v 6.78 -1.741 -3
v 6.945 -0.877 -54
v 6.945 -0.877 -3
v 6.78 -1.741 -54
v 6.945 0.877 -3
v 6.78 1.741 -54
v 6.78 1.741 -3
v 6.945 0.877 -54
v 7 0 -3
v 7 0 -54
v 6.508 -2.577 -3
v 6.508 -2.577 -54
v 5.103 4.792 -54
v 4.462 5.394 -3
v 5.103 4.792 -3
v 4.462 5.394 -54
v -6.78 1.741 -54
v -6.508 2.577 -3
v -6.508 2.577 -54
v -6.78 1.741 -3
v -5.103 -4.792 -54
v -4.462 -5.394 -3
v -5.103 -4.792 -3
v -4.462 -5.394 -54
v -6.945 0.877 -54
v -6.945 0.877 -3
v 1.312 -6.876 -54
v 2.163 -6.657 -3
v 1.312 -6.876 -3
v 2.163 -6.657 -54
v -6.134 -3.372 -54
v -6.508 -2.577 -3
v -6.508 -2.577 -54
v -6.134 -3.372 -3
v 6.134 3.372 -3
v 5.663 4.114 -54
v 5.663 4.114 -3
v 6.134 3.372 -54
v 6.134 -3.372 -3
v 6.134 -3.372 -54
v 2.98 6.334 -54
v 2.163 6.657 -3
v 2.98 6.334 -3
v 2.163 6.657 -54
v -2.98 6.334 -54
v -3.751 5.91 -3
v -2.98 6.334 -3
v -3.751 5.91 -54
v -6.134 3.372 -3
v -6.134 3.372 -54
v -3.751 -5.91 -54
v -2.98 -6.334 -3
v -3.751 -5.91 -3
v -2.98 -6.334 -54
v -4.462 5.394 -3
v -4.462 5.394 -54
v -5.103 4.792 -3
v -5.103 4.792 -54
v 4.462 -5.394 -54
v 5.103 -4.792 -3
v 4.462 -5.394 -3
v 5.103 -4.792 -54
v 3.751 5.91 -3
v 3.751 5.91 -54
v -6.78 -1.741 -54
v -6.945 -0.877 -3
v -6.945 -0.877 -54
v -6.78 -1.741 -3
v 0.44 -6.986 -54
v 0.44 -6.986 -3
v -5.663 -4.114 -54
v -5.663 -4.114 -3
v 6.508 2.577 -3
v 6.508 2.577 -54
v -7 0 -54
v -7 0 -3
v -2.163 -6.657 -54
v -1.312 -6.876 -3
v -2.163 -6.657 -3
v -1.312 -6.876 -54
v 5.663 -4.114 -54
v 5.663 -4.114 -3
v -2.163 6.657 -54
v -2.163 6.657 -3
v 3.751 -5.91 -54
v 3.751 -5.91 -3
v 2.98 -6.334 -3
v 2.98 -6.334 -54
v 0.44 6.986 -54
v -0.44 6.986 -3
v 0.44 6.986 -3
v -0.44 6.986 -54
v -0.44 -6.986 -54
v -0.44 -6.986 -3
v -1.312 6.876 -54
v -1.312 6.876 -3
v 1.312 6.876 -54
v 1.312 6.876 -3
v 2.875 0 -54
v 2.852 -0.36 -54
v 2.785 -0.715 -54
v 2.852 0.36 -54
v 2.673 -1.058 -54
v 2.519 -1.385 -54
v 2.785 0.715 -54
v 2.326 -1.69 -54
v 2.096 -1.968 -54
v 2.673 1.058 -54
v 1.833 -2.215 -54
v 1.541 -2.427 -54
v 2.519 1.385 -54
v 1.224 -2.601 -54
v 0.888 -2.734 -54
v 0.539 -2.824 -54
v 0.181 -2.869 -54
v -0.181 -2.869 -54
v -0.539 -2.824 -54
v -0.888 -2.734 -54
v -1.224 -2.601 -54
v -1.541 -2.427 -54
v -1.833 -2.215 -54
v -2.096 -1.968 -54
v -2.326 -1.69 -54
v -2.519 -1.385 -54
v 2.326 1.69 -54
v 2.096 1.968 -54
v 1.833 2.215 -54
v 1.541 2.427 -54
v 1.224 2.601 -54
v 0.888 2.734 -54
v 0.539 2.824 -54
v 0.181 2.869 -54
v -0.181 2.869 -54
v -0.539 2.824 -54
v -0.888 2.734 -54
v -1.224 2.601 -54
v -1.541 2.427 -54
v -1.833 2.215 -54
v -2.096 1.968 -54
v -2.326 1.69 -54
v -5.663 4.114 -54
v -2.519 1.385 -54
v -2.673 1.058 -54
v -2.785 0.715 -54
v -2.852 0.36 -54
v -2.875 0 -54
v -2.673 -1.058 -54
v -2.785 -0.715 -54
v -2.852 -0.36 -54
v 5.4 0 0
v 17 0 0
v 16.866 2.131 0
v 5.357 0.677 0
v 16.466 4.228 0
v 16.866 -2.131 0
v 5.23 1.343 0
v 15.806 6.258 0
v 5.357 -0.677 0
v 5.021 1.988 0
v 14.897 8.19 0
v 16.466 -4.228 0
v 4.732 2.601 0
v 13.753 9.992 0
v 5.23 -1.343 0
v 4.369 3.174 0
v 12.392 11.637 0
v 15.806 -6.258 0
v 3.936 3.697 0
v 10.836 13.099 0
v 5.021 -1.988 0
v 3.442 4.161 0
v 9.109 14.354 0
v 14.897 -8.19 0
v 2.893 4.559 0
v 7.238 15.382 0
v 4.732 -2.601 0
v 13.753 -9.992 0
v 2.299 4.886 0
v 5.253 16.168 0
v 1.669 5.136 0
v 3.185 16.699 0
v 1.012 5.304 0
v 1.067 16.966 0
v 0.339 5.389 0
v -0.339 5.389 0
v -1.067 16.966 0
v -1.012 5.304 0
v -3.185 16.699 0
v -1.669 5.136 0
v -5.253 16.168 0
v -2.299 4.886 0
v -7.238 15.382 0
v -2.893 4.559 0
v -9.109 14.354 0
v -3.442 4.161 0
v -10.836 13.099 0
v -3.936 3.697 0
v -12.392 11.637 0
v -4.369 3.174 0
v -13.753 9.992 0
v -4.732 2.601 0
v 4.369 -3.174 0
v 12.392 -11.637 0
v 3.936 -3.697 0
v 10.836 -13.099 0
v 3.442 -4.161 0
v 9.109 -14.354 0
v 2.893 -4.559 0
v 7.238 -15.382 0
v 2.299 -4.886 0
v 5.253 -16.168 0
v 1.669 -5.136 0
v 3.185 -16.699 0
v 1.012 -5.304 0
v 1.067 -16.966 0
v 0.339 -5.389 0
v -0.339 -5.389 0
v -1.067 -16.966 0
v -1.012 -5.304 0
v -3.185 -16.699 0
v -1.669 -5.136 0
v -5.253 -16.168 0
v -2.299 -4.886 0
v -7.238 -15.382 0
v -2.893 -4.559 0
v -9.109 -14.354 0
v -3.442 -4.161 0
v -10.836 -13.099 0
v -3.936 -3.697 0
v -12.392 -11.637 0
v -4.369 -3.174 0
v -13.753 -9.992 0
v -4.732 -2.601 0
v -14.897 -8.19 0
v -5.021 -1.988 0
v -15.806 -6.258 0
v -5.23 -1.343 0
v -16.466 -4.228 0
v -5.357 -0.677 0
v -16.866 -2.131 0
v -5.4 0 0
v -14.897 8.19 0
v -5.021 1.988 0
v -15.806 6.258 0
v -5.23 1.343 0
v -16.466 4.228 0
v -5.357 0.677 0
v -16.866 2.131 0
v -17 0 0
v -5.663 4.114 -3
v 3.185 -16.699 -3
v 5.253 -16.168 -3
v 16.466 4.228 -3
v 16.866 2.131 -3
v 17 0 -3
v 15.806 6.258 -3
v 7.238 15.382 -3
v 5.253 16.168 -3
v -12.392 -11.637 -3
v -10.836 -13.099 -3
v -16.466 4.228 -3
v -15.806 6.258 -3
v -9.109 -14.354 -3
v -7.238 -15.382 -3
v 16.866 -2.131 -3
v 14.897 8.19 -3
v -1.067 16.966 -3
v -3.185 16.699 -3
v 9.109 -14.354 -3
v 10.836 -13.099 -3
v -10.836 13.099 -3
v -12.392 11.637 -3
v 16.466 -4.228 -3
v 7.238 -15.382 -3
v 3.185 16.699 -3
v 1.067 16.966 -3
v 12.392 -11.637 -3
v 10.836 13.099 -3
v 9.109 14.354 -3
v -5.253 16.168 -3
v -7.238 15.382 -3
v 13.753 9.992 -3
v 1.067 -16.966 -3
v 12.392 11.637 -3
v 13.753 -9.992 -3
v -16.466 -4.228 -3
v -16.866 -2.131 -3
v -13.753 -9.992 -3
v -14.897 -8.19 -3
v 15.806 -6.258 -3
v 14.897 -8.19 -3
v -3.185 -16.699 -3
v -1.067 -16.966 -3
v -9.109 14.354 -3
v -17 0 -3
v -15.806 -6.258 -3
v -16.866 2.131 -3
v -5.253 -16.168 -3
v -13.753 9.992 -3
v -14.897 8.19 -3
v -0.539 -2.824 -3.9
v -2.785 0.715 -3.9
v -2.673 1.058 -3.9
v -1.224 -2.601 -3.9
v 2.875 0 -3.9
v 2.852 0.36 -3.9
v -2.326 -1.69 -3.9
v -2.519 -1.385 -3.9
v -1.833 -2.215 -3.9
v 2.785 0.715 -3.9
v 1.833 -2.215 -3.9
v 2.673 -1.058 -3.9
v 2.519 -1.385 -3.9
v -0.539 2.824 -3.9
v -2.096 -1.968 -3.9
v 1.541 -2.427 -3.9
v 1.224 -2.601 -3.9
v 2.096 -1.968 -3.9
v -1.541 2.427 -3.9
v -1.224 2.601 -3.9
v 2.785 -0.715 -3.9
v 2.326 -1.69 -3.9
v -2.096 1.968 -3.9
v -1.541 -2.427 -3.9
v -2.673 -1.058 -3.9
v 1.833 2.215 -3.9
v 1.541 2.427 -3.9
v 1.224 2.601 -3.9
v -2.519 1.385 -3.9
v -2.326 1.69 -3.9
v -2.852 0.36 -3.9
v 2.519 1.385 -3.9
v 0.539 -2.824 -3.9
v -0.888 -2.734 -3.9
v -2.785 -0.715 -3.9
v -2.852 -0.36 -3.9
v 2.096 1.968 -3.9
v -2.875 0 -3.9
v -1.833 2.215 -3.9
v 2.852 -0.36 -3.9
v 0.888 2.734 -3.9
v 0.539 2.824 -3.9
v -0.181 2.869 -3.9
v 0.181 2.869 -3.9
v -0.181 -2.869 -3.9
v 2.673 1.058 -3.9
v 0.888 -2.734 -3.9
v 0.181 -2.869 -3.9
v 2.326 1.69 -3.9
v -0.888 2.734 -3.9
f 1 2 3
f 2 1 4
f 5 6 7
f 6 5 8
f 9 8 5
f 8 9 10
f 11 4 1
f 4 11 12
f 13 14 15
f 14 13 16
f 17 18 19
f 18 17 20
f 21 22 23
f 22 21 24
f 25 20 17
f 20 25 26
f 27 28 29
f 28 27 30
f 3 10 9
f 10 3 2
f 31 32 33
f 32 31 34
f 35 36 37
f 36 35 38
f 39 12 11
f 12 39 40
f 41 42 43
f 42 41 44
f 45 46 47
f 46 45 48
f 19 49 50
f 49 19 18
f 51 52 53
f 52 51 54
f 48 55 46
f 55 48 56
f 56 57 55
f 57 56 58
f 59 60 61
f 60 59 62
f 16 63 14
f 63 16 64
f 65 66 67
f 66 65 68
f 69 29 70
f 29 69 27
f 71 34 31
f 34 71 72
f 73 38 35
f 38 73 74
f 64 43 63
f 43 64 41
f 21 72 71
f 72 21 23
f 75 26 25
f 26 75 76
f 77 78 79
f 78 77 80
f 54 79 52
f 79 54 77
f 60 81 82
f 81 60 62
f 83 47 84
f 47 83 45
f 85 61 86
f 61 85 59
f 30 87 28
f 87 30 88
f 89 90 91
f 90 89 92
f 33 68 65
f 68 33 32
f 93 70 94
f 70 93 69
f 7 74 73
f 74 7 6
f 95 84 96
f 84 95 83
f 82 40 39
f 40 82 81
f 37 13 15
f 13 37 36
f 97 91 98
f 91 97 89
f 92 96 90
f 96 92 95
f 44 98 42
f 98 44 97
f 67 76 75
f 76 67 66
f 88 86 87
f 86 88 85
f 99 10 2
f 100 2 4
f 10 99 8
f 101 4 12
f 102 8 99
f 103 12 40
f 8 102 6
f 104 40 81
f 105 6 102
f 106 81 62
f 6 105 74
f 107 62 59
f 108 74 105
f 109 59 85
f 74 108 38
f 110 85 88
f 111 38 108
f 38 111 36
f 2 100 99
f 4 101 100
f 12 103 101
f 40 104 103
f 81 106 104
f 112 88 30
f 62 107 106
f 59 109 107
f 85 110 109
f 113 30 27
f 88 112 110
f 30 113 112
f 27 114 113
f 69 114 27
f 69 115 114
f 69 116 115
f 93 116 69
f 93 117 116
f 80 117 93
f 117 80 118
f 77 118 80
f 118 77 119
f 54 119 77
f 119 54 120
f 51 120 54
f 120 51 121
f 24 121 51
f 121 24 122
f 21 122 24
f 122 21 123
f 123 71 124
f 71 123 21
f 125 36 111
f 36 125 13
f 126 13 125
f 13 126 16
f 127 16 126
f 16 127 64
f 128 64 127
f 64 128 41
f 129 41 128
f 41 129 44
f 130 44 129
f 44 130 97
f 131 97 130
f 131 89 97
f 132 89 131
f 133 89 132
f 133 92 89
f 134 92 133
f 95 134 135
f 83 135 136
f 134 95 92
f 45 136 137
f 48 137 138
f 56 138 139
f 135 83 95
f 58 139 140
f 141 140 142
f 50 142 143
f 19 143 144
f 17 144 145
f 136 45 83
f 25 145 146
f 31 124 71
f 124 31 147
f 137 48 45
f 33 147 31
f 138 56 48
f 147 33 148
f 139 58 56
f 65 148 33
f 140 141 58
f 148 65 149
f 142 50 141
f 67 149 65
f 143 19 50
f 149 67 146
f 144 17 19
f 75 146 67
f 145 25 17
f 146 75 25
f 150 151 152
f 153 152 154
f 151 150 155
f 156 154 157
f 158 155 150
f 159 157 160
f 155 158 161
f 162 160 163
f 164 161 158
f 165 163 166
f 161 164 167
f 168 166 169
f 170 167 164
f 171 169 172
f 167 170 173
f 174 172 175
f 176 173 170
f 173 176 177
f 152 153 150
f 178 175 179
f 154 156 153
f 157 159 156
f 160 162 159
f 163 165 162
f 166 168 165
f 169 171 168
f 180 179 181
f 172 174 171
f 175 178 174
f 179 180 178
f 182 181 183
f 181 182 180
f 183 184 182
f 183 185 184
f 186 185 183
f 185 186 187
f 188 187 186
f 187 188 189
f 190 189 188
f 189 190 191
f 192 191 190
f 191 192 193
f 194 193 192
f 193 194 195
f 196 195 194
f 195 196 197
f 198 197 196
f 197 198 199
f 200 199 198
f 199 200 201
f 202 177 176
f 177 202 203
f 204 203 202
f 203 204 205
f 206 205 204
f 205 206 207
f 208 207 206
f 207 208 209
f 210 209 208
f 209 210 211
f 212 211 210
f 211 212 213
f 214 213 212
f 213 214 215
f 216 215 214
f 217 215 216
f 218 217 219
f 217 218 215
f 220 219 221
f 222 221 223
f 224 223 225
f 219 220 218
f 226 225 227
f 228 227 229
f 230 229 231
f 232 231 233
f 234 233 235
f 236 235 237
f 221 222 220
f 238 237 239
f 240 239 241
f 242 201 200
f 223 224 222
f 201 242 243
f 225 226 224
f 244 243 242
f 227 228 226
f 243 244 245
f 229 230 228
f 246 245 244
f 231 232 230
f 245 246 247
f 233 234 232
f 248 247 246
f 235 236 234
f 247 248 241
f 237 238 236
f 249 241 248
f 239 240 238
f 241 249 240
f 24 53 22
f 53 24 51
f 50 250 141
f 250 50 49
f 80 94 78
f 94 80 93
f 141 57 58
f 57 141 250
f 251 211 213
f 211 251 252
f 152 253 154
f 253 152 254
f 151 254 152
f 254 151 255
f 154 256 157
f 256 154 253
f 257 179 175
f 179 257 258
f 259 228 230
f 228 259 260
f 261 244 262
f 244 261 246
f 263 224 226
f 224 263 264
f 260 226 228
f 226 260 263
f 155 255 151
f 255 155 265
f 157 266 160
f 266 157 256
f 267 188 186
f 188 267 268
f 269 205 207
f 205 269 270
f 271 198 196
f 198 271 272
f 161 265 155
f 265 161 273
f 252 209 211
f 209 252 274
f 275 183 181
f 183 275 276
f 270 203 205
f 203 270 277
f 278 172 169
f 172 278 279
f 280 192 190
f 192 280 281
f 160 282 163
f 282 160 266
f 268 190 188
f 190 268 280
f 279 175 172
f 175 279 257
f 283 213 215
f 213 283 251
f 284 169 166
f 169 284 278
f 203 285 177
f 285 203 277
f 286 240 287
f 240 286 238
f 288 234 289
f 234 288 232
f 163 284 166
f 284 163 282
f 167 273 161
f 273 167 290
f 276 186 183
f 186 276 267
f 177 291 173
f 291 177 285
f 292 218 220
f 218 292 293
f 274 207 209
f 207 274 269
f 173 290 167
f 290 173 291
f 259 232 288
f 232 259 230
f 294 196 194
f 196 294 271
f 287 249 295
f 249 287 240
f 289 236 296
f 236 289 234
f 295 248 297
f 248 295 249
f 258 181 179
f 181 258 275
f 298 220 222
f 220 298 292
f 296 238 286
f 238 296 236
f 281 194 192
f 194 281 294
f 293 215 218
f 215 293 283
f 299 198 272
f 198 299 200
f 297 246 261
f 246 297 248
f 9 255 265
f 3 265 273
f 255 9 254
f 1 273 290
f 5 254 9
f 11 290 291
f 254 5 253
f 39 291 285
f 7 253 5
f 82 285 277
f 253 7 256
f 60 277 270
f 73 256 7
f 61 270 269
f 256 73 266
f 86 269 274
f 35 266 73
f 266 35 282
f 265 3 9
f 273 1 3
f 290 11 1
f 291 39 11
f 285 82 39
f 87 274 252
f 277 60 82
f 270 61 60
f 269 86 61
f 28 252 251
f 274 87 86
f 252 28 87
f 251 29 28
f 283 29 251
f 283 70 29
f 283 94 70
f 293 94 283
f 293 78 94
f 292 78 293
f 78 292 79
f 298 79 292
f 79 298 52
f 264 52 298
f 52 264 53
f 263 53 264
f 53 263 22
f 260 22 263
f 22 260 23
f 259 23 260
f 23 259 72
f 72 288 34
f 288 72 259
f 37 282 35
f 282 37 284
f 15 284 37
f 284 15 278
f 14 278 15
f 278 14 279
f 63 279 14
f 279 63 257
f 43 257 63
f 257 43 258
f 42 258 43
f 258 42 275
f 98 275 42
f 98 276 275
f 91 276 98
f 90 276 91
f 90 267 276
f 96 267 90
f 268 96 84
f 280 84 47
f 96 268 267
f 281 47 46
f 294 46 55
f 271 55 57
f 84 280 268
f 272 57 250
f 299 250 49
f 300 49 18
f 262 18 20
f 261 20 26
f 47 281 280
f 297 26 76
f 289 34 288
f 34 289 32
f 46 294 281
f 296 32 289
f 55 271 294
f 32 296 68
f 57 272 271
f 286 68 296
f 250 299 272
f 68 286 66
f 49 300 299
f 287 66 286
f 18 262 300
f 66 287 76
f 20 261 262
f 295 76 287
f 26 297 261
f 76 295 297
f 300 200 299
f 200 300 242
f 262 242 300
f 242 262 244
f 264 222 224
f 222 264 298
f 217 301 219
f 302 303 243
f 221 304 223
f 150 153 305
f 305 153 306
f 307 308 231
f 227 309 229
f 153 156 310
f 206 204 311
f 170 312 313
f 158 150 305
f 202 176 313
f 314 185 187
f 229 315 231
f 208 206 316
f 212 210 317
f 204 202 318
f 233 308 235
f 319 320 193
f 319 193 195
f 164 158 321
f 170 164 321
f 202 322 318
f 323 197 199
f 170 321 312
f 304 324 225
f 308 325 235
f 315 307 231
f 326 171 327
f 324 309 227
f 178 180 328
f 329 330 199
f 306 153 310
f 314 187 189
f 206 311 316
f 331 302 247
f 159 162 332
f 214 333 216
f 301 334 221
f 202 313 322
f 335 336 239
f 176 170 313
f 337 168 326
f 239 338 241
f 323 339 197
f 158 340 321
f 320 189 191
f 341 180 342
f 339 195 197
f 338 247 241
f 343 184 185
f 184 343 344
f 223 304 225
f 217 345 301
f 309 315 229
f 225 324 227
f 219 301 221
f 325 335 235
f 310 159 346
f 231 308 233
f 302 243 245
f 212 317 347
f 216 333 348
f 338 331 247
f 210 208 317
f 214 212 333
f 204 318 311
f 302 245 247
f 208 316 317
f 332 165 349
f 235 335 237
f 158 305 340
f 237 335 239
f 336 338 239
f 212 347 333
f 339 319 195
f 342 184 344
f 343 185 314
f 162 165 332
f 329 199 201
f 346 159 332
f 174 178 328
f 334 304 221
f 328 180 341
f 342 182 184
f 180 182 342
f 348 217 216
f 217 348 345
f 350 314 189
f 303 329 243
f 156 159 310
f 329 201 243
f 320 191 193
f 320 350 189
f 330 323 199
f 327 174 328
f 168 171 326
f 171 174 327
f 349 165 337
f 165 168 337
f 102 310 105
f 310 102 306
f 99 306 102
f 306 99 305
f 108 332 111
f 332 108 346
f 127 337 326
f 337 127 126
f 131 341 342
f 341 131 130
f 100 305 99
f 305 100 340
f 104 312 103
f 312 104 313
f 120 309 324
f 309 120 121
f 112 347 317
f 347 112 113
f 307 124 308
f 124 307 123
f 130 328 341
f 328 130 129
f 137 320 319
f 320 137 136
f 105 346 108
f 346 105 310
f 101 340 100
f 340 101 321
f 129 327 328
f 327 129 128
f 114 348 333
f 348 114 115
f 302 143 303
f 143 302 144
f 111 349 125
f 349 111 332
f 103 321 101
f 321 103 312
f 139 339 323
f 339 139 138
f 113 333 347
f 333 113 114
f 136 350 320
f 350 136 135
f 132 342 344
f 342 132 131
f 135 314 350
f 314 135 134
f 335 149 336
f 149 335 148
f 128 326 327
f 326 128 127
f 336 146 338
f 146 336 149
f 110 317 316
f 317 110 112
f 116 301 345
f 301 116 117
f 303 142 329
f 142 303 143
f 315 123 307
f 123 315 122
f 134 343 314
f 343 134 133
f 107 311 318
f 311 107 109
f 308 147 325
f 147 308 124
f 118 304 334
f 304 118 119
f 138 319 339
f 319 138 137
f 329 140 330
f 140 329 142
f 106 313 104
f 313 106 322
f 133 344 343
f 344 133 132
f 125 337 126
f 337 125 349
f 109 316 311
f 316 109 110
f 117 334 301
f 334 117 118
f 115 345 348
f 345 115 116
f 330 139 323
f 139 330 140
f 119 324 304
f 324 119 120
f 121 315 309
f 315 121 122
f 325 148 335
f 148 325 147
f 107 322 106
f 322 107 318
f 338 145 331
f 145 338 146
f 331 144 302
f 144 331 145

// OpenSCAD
$fn = 50;


difference() {
	union() {
		translate(v = [0, 0, -54.0000000000]) {
			cylinder(h = 54, r = 7.0000000000);
		}
		translate(v = [0, 0, -3.0000000000]) {
			cylinder(h = 3, r = 17.0000000000);
		}
	}
	union() {
		translate(v = [0, 0, 0]) {
			rotate(a = [0, 0, 0]) {
				difference() {
					union() {
						#translate(v = [0, 0, -54.0000000000]) {
							cylinder(h = 54, r = 2.6000000000);
						}
						#translate(v = [0, 0, -3.9000000000]) {
							cylinder(h = 3.9000000000, r1 = 2.8750000000, r2 = 5.4000000000);
						}
						#translate(v = [0, 0, -54.0000000000]) {
							cylinder(h = 54, r = 2.8750000000);
						}
						#translate(v = [0, 0, -54.0000000000]) {
							cylinder(h = 54, r = 2.6000000000);
						}
					}
					union();
				}
			}
		}
	}
}
